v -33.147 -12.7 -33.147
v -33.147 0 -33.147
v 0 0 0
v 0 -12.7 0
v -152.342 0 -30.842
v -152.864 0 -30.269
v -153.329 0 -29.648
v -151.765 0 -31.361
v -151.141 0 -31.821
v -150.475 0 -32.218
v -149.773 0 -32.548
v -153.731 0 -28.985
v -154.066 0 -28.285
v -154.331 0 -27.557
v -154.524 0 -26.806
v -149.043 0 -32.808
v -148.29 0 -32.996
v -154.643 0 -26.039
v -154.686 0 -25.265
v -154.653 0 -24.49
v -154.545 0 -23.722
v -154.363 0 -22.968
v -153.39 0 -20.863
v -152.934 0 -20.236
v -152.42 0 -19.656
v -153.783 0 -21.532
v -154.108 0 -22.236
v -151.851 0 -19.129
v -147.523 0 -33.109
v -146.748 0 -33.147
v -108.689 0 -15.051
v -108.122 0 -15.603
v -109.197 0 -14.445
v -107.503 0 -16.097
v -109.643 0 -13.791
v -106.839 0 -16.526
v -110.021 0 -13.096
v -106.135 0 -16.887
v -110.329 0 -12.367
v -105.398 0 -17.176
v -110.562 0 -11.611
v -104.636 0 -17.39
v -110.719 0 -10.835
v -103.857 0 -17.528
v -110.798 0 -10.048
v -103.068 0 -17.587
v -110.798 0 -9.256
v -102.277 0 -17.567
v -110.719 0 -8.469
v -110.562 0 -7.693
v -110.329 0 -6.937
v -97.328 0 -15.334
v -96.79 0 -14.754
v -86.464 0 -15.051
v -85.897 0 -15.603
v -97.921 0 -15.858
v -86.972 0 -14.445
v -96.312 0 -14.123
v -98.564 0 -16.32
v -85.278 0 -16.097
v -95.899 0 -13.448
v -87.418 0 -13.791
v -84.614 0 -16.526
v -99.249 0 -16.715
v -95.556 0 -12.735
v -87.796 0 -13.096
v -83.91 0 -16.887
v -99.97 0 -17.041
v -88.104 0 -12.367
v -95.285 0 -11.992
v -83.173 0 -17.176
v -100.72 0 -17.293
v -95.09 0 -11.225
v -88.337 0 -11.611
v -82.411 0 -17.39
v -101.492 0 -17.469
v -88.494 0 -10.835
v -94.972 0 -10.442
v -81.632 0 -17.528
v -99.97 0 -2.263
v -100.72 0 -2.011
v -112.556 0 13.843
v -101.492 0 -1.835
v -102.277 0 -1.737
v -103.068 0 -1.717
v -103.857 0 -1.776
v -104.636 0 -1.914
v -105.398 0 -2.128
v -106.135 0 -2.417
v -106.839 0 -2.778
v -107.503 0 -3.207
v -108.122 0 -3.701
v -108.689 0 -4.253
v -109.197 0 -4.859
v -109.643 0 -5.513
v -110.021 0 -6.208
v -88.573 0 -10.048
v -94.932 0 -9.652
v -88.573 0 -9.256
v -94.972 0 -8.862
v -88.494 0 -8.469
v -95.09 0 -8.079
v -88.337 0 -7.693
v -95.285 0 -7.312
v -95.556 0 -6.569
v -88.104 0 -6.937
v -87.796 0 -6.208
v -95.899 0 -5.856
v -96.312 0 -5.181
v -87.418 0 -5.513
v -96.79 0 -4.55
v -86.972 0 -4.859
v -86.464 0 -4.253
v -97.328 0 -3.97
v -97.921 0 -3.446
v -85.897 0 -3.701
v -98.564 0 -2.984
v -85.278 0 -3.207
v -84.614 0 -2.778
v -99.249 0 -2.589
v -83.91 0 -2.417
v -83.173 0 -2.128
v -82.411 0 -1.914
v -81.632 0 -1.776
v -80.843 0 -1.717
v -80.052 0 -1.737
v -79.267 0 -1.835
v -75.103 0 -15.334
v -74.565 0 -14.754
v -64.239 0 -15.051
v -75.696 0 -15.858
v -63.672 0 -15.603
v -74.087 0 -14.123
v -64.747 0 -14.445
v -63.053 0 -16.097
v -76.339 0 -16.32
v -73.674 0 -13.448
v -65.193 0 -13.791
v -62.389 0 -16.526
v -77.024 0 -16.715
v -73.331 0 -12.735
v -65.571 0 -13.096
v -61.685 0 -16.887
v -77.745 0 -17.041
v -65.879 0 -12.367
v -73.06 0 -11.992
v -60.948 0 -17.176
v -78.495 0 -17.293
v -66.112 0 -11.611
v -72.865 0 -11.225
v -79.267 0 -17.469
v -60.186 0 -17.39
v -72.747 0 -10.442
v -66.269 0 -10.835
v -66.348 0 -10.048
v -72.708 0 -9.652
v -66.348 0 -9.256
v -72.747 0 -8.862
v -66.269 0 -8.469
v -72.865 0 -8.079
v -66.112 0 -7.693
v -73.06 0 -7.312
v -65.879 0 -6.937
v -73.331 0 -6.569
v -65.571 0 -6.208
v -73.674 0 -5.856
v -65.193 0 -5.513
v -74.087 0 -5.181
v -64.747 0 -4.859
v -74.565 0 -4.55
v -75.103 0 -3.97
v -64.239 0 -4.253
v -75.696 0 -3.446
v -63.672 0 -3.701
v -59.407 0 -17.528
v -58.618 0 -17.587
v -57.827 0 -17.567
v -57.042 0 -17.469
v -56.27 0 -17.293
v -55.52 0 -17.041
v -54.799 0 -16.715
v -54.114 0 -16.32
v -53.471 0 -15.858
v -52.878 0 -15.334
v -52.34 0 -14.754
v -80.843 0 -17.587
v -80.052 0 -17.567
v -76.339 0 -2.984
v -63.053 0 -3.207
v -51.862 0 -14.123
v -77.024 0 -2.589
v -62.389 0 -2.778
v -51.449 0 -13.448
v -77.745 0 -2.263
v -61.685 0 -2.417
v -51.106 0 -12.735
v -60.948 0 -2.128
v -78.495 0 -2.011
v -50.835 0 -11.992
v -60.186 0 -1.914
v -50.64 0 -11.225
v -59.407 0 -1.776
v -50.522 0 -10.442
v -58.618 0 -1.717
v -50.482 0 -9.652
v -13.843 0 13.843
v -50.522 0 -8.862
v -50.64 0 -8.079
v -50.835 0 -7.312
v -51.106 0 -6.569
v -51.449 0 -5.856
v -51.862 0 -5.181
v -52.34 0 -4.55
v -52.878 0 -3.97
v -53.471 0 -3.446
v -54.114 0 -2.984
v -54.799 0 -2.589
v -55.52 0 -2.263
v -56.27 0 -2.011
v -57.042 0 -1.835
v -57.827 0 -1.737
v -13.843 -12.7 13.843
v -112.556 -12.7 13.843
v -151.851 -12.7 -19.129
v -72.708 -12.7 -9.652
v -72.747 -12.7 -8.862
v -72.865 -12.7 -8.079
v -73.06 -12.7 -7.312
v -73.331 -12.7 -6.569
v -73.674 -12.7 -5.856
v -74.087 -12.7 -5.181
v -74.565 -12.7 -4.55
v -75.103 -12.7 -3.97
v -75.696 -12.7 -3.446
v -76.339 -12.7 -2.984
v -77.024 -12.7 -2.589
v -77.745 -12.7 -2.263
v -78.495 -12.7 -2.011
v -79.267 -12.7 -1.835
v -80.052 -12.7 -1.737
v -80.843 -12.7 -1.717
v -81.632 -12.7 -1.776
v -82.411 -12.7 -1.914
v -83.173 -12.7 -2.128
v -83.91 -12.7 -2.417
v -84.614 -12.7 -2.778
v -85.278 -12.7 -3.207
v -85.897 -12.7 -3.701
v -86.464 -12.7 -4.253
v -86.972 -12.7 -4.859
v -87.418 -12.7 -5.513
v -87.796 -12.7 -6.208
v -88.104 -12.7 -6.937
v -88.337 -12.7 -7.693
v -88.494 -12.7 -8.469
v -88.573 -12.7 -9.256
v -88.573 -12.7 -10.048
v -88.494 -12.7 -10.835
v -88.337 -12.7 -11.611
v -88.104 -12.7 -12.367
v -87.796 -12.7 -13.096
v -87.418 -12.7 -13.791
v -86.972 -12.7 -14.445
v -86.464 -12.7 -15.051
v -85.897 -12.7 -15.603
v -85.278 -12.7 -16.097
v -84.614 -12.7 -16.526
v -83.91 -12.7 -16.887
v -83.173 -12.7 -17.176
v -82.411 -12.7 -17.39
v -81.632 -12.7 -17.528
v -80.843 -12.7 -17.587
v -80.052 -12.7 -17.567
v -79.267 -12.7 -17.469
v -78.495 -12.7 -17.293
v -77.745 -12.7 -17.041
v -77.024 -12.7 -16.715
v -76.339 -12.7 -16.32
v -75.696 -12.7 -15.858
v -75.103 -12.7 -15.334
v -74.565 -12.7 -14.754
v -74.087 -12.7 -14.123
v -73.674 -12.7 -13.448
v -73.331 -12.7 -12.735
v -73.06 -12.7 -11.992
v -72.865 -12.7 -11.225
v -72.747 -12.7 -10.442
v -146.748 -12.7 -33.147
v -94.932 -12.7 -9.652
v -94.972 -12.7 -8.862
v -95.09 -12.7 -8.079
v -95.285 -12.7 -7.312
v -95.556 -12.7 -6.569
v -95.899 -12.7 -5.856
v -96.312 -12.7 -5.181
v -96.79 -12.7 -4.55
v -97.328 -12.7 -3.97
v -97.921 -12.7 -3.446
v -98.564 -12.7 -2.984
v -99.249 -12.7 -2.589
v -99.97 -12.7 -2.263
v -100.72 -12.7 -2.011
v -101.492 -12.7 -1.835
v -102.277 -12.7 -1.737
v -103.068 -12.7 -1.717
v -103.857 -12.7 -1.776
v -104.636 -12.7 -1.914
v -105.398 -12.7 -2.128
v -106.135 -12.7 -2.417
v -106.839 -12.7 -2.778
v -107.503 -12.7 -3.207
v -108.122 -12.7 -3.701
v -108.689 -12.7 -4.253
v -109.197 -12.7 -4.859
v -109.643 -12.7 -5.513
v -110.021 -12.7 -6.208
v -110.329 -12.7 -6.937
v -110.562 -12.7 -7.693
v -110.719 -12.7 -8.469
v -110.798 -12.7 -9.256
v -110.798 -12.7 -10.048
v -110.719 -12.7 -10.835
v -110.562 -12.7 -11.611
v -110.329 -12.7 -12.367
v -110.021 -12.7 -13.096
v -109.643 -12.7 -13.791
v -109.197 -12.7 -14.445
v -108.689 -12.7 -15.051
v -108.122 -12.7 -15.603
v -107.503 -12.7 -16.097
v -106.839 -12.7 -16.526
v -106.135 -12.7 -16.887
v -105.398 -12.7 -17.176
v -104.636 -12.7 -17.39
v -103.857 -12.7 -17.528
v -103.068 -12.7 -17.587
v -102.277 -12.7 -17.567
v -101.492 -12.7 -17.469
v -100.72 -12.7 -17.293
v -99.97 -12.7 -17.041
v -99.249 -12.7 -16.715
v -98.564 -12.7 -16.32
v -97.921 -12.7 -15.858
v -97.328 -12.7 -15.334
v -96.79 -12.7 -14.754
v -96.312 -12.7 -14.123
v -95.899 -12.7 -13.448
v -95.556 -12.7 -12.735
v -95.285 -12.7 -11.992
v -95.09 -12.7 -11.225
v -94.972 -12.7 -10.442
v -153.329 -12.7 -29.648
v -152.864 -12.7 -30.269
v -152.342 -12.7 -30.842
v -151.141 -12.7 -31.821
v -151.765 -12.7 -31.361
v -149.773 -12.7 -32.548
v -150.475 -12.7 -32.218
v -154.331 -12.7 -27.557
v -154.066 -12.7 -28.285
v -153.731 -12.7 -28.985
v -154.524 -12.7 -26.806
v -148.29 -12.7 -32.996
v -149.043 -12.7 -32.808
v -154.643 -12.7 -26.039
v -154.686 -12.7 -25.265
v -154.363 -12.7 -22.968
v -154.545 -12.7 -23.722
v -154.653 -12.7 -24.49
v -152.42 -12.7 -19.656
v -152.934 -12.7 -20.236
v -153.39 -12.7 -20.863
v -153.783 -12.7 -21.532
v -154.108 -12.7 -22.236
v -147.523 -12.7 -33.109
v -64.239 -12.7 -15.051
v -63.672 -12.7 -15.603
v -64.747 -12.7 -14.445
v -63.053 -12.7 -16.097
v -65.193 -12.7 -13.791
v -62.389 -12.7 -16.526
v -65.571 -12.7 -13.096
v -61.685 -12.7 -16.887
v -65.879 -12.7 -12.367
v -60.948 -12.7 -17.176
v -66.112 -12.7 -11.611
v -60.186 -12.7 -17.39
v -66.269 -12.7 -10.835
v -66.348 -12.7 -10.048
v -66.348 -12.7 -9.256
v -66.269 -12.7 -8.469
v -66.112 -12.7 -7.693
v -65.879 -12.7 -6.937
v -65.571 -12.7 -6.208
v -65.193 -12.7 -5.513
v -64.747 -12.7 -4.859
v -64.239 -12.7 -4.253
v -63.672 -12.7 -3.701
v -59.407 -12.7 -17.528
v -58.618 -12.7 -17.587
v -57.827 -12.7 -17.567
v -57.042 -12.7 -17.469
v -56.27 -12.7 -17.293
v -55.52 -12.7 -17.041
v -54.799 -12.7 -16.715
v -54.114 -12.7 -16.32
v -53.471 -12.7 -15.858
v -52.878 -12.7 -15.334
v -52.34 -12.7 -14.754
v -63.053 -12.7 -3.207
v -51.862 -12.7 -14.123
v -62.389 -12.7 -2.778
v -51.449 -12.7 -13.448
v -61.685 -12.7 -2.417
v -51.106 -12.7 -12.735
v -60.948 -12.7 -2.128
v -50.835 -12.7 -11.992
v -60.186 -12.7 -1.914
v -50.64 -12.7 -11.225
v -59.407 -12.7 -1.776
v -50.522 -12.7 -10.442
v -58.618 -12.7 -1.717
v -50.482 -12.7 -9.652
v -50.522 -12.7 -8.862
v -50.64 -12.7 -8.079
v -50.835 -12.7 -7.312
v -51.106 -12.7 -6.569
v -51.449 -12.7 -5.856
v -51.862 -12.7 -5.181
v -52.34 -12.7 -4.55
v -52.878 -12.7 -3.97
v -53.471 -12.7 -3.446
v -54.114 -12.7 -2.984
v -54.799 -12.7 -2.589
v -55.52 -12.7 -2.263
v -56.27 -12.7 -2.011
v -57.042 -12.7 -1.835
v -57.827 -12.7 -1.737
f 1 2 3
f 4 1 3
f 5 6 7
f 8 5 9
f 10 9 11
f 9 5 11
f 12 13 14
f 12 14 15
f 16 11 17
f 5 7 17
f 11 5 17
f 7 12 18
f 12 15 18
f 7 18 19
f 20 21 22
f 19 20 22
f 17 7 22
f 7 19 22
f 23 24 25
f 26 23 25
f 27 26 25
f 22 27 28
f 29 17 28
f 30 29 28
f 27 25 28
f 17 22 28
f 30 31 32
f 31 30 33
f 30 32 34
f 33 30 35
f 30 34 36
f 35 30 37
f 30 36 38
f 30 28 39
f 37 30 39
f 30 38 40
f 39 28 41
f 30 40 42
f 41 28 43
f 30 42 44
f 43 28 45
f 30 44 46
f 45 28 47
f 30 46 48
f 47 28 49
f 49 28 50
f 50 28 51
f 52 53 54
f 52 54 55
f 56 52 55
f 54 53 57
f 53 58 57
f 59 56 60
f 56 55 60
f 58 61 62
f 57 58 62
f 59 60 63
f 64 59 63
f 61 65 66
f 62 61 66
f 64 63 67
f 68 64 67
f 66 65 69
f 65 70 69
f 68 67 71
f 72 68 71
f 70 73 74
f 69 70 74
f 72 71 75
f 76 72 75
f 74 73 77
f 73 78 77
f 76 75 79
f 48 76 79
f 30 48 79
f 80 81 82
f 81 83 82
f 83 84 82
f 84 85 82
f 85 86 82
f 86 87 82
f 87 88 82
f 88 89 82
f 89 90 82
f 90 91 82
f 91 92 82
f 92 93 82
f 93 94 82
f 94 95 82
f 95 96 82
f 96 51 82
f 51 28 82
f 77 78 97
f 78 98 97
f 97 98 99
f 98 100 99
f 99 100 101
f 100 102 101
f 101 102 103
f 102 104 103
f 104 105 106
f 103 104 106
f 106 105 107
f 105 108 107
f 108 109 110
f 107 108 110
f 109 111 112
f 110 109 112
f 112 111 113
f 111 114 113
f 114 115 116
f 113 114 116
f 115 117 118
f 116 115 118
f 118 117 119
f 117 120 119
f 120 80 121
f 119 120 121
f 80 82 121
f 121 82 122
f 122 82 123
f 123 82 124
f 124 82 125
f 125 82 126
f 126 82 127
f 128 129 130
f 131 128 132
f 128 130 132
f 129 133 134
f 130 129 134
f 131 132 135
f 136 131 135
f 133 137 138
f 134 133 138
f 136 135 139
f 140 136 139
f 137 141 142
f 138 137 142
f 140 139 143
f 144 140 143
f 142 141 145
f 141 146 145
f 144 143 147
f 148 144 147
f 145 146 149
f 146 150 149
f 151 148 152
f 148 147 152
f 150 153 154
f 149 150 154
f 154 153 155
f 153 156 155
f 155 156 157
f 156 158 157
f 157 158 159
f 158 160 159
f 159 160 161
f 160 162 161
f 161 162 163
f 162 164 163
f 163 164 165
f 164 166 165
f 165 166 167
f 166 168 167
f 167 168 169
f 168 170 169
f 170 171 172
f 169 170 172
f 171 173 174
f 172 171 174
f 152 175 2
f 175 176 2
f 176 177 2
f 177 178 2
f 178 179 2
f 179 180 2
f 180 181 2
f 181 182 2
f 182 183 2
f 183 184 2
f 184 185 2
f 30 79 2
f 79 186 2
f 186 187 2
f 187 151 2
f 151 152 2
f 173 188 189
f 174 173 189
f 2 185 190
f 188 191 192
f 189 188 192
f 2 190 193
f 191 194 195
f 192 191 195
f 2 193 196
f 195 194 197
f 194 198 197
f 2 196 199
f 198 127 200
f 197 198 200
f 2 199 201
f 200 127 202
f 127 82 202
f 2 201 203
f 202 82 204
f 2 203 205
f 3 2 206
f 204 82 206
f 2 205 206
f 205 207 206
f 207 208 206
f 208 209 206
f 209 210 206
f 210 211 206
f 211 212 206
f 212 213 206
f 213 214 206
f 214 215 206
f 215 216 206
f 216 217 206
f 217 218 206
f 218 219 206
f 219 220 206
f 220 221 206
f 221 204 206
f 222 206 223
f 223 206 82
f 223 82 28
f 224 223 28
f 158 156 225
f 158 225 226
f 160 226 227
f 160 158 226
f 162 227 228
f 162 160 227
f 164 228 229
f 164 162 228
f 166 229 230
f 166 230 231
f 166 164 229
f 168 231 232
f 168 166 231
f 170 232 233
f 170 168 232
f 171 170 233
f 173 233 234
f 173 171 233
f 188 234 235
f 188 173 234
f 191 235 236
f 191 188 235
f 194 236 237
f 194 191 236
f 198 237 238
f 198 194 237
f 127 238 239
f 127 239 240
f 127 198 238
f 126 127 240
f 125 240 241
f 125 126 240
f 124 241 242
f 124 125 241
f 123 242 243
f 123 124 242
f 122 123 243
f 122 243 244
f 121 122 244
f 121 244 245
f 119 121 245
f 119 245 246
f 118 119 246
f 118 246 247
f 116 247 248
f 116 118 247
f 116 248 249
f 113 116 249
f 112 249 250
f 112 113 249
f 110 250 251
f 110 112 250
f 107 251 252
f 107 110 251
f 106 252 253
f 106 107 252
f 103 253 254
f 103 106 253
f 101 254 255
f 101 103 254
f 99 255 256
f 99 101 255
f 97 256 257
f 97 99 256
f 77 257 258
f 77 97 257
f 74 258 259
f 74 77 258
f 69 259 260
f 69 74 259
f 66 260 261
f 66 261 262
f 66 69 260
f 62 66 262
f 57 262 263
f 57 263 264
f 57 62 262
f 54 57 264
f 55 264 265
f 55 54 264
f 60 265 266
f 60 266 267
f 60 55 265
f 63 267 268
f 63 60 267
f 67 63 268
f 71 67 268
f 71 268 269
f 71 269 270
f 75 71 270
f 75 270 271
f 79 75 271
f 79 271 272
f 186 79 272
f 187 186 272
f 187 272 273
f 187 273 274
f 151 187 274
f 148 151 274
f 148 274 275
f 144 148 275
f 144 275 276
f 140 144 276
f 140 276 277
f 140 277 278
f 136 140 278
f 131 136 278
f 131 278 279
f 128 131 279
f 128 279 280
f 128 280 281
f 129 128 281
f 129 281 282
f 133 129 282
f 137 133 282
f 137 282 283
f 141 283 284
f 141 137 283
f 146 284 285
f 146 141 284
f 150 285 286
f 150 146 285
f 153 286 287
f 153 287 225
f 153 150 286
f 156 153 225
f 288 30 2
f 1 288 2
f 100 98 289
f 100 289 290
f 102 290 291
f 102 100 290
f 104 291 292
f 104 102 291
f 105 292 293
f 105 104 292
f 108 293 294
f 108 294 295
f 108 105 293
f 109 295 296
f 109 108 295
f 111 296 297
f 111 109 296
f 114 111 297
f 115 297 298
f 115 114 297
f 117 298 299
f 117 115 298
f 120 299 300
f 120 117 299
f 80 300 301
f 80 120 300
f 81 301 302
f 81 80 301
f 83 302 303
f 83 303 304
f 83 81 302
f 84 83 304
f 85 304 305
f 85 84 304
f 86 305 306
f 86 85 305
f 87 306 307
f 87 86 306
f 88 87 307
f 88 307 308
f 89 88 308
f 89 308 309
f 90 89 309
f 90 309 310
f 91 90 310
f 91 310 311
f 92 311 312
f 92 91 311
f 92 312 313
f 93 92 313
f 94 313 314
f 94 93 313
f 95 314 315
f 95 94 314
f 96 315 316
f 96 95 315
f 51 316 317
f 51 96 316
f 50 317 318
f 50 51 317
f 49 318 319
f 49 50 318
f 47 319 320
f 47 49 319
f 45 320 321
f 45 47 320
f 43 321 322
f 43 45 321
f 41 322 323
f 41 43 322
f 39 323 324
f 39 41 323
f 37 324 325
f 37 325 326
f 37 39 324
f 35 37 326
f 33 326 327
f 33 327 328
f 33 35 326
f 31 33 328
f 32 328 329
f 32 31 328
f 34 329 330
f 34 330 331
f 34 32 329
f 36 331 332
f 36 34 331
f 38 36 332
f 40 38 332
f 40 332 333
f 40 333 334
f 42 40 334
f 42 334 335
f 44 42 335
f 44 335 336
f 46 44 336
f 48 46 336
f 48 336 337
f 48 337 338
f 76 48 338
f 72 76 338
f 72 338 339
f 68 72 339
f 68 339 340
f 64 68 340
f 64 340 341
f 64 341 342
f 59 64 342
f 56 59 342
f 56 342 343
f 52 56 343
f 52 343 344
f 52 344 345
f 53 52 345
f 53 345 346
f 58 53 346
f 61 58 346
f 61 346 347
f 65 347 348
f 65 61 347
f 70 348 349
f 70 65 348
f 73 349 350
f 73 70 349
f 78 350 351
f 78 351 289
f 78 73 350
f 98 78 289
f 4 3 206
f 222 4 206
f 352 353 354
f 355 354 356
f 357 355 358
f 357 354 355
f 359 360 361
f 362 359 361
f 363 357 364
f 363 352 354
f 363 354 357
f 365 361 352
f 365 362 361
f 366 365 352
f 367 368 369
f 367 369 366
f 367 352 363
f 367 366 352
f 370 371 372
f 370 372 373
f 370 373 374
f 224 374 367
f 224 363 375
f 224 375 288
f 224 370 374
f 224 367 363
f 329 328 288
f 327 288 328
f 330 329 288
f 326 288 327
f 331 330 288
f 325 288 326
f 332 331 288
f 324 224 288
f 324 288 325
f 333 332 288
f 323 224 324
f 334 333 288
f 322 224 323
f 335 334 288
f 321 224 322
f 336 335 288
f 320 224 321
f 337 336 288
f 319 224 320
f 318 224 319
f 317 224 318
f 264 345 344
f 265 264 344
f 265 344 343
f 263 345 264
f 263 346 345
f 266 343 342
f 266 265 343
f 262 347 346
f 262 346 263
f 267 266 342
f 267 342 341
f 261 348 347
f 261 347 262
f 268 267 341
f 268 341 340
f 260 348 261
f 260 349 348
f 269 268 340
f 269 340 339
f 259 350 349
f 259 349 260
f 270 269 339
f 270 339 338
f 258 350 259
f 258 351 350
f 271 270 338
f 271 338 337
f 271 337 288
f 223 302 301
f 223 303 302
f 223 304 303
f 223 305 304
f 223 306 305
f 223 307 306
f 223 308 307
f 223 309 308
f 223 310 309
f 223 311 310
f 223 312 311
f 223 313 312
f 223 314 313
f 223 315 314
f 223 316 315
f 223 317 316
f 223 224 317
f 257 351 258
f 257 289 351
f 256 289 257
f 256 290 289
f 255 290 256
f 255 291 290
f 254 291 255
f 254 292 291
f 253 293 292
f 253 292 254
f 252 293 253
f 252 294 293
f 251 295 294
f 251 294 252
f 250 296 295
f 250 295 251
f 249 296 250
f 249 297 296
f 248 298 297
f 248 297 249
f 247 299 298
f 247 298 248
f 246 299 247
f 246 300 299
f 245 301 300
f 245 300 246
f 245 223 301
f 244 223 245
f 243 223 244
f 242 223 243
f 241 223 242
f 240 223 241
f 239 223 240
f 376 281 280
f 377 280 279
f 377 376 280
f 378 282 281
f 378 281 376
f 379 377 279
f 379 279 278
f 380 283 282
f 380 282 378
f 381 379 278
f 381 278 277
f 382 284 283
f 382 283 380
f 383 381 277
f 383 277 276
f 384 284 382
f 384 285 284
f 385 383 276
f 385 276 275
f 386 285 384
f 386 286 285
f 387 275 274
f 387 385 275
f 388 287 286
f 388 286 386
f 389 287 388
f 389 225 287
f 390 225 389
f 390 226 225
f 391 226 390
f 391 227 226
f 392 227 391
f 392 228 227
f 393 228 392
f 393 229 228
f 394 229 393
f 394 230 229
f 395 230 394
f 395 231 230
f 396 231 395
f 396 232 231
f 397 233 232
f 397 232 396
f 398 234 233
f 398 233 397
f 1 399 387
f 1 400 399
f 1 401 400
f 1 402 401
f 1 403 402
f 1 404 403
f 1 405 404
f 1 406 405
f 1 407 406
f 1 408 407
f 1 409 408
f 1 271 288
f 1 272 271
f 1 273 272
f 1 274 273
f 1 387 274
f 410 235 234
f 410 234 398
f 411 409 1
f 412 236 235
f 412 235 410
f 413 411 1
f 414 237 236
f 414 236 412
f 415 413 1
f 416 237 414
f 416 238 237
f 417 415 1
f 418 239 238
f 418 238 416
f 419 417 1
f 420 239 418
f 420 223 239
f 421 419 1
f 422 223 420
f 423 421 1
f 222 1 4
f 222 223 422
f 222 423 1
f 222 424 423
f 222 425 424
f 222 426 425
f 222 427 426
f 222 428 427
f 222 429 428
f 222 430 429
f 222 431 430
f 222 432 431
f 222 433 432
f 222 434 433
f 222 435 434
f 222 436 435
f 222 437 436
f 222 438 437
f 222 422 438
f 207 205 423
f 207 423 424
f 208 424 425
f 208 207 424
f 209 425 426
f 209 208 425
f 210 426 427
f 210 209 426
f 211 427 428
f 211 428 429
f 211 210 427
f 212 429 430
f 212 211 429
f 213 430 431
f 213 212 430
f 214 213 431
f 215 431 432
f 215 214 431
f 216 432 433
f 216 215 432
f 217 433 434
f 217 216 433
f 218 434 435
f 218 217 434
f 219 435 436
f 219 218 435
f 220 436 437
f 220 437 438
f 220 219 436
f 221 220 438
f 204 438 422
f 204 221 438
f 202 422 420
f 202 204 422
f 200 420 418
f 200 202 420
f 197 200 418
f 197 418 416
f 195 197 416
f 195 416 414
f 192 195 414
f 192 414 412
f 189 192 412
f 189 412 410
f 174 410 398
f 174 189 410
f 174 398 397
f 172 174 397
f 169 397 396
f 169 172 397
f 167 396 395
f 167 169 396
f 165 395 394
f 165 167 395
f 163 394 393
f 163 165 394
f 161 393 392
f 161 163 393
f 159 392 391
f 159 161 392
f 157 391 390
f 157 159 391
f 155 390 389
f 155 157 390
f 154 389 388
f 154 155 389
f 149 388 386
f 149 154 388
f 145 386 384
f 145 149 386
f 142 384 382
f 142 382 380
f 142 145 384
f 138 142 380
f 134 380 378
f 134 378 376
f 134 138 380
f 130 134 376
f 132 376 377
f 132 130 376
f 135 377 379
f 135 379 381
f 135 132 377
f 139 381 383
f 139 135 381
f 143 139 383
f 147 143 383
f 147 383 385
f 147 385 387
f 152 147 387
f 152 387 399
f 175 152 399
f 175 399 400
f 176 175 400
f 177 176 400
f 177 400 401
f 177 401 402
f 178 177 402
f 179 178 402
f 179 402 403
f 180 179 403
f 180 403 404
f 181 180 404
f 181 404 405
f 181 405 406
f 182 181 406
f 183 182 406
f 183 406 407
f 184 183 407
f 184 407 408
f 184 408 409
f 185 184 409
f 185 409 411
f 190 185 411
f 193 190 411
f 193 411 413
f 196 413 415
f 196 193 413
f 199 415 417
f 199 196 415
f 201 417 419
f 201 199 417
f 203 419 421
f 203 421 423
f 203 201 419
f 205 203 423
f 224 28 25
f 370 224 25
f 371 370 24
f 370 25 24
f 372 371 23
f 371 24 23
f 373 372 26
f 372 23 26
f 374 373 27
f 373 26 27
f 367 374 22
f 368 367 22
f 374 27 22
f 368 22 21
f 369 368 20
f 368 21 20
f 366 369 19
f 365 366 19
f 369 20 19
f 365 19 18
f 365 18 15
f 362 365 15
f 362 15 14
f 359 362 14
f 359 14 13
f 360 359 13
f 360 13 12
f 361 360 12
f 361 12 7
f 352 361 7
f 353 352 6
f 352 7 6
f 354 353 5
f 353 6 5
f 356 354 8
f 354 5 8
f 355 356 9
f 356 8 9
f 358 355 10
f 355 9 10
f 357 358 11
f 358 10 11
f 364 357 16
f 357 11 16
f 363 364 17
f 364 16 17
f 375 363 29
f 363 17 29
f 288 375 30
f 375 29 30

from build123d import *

# Parameters (mm, degrees)
F0_R     = 7.9375
F1_DEPTH = 12.7


with BuildPart() as f1:
    # F0 (on Front) → F1 (new body)
    with BuildSketch(Plane.XZ):
        with BuildLine():
            Line((-33.147, -33.147), (0, 0))
            Line((0, 0), (-13.843, 13.843))
            Line((-13.843, 13.843), (-112.556101, 13.843))
            Line((-112.556101, 13.843), (-151.850627, -19.129022))
            ThreePointArc((-151.850627, -19.129022), (-154.20731, -27.924285), (-146.7485, -33.147))
            Line((-146.7485, -33.147), (-33.147, -33.147))
        make_face()
        with Locations((-102.87, -9.652)):
            Circle(F0_R, mode=Mode.SUBTRACT)
        with Locations((-80.645, -9.652)):
            Circle(F0_R, mode=Mode.SUBTRACT)
        with Locations((-58.42, -9.652)):
            Circle(F0_R, mode=Mode.SUBTRACT)
    extrude(amount=F1_DEPTH)


solid = f1.part
